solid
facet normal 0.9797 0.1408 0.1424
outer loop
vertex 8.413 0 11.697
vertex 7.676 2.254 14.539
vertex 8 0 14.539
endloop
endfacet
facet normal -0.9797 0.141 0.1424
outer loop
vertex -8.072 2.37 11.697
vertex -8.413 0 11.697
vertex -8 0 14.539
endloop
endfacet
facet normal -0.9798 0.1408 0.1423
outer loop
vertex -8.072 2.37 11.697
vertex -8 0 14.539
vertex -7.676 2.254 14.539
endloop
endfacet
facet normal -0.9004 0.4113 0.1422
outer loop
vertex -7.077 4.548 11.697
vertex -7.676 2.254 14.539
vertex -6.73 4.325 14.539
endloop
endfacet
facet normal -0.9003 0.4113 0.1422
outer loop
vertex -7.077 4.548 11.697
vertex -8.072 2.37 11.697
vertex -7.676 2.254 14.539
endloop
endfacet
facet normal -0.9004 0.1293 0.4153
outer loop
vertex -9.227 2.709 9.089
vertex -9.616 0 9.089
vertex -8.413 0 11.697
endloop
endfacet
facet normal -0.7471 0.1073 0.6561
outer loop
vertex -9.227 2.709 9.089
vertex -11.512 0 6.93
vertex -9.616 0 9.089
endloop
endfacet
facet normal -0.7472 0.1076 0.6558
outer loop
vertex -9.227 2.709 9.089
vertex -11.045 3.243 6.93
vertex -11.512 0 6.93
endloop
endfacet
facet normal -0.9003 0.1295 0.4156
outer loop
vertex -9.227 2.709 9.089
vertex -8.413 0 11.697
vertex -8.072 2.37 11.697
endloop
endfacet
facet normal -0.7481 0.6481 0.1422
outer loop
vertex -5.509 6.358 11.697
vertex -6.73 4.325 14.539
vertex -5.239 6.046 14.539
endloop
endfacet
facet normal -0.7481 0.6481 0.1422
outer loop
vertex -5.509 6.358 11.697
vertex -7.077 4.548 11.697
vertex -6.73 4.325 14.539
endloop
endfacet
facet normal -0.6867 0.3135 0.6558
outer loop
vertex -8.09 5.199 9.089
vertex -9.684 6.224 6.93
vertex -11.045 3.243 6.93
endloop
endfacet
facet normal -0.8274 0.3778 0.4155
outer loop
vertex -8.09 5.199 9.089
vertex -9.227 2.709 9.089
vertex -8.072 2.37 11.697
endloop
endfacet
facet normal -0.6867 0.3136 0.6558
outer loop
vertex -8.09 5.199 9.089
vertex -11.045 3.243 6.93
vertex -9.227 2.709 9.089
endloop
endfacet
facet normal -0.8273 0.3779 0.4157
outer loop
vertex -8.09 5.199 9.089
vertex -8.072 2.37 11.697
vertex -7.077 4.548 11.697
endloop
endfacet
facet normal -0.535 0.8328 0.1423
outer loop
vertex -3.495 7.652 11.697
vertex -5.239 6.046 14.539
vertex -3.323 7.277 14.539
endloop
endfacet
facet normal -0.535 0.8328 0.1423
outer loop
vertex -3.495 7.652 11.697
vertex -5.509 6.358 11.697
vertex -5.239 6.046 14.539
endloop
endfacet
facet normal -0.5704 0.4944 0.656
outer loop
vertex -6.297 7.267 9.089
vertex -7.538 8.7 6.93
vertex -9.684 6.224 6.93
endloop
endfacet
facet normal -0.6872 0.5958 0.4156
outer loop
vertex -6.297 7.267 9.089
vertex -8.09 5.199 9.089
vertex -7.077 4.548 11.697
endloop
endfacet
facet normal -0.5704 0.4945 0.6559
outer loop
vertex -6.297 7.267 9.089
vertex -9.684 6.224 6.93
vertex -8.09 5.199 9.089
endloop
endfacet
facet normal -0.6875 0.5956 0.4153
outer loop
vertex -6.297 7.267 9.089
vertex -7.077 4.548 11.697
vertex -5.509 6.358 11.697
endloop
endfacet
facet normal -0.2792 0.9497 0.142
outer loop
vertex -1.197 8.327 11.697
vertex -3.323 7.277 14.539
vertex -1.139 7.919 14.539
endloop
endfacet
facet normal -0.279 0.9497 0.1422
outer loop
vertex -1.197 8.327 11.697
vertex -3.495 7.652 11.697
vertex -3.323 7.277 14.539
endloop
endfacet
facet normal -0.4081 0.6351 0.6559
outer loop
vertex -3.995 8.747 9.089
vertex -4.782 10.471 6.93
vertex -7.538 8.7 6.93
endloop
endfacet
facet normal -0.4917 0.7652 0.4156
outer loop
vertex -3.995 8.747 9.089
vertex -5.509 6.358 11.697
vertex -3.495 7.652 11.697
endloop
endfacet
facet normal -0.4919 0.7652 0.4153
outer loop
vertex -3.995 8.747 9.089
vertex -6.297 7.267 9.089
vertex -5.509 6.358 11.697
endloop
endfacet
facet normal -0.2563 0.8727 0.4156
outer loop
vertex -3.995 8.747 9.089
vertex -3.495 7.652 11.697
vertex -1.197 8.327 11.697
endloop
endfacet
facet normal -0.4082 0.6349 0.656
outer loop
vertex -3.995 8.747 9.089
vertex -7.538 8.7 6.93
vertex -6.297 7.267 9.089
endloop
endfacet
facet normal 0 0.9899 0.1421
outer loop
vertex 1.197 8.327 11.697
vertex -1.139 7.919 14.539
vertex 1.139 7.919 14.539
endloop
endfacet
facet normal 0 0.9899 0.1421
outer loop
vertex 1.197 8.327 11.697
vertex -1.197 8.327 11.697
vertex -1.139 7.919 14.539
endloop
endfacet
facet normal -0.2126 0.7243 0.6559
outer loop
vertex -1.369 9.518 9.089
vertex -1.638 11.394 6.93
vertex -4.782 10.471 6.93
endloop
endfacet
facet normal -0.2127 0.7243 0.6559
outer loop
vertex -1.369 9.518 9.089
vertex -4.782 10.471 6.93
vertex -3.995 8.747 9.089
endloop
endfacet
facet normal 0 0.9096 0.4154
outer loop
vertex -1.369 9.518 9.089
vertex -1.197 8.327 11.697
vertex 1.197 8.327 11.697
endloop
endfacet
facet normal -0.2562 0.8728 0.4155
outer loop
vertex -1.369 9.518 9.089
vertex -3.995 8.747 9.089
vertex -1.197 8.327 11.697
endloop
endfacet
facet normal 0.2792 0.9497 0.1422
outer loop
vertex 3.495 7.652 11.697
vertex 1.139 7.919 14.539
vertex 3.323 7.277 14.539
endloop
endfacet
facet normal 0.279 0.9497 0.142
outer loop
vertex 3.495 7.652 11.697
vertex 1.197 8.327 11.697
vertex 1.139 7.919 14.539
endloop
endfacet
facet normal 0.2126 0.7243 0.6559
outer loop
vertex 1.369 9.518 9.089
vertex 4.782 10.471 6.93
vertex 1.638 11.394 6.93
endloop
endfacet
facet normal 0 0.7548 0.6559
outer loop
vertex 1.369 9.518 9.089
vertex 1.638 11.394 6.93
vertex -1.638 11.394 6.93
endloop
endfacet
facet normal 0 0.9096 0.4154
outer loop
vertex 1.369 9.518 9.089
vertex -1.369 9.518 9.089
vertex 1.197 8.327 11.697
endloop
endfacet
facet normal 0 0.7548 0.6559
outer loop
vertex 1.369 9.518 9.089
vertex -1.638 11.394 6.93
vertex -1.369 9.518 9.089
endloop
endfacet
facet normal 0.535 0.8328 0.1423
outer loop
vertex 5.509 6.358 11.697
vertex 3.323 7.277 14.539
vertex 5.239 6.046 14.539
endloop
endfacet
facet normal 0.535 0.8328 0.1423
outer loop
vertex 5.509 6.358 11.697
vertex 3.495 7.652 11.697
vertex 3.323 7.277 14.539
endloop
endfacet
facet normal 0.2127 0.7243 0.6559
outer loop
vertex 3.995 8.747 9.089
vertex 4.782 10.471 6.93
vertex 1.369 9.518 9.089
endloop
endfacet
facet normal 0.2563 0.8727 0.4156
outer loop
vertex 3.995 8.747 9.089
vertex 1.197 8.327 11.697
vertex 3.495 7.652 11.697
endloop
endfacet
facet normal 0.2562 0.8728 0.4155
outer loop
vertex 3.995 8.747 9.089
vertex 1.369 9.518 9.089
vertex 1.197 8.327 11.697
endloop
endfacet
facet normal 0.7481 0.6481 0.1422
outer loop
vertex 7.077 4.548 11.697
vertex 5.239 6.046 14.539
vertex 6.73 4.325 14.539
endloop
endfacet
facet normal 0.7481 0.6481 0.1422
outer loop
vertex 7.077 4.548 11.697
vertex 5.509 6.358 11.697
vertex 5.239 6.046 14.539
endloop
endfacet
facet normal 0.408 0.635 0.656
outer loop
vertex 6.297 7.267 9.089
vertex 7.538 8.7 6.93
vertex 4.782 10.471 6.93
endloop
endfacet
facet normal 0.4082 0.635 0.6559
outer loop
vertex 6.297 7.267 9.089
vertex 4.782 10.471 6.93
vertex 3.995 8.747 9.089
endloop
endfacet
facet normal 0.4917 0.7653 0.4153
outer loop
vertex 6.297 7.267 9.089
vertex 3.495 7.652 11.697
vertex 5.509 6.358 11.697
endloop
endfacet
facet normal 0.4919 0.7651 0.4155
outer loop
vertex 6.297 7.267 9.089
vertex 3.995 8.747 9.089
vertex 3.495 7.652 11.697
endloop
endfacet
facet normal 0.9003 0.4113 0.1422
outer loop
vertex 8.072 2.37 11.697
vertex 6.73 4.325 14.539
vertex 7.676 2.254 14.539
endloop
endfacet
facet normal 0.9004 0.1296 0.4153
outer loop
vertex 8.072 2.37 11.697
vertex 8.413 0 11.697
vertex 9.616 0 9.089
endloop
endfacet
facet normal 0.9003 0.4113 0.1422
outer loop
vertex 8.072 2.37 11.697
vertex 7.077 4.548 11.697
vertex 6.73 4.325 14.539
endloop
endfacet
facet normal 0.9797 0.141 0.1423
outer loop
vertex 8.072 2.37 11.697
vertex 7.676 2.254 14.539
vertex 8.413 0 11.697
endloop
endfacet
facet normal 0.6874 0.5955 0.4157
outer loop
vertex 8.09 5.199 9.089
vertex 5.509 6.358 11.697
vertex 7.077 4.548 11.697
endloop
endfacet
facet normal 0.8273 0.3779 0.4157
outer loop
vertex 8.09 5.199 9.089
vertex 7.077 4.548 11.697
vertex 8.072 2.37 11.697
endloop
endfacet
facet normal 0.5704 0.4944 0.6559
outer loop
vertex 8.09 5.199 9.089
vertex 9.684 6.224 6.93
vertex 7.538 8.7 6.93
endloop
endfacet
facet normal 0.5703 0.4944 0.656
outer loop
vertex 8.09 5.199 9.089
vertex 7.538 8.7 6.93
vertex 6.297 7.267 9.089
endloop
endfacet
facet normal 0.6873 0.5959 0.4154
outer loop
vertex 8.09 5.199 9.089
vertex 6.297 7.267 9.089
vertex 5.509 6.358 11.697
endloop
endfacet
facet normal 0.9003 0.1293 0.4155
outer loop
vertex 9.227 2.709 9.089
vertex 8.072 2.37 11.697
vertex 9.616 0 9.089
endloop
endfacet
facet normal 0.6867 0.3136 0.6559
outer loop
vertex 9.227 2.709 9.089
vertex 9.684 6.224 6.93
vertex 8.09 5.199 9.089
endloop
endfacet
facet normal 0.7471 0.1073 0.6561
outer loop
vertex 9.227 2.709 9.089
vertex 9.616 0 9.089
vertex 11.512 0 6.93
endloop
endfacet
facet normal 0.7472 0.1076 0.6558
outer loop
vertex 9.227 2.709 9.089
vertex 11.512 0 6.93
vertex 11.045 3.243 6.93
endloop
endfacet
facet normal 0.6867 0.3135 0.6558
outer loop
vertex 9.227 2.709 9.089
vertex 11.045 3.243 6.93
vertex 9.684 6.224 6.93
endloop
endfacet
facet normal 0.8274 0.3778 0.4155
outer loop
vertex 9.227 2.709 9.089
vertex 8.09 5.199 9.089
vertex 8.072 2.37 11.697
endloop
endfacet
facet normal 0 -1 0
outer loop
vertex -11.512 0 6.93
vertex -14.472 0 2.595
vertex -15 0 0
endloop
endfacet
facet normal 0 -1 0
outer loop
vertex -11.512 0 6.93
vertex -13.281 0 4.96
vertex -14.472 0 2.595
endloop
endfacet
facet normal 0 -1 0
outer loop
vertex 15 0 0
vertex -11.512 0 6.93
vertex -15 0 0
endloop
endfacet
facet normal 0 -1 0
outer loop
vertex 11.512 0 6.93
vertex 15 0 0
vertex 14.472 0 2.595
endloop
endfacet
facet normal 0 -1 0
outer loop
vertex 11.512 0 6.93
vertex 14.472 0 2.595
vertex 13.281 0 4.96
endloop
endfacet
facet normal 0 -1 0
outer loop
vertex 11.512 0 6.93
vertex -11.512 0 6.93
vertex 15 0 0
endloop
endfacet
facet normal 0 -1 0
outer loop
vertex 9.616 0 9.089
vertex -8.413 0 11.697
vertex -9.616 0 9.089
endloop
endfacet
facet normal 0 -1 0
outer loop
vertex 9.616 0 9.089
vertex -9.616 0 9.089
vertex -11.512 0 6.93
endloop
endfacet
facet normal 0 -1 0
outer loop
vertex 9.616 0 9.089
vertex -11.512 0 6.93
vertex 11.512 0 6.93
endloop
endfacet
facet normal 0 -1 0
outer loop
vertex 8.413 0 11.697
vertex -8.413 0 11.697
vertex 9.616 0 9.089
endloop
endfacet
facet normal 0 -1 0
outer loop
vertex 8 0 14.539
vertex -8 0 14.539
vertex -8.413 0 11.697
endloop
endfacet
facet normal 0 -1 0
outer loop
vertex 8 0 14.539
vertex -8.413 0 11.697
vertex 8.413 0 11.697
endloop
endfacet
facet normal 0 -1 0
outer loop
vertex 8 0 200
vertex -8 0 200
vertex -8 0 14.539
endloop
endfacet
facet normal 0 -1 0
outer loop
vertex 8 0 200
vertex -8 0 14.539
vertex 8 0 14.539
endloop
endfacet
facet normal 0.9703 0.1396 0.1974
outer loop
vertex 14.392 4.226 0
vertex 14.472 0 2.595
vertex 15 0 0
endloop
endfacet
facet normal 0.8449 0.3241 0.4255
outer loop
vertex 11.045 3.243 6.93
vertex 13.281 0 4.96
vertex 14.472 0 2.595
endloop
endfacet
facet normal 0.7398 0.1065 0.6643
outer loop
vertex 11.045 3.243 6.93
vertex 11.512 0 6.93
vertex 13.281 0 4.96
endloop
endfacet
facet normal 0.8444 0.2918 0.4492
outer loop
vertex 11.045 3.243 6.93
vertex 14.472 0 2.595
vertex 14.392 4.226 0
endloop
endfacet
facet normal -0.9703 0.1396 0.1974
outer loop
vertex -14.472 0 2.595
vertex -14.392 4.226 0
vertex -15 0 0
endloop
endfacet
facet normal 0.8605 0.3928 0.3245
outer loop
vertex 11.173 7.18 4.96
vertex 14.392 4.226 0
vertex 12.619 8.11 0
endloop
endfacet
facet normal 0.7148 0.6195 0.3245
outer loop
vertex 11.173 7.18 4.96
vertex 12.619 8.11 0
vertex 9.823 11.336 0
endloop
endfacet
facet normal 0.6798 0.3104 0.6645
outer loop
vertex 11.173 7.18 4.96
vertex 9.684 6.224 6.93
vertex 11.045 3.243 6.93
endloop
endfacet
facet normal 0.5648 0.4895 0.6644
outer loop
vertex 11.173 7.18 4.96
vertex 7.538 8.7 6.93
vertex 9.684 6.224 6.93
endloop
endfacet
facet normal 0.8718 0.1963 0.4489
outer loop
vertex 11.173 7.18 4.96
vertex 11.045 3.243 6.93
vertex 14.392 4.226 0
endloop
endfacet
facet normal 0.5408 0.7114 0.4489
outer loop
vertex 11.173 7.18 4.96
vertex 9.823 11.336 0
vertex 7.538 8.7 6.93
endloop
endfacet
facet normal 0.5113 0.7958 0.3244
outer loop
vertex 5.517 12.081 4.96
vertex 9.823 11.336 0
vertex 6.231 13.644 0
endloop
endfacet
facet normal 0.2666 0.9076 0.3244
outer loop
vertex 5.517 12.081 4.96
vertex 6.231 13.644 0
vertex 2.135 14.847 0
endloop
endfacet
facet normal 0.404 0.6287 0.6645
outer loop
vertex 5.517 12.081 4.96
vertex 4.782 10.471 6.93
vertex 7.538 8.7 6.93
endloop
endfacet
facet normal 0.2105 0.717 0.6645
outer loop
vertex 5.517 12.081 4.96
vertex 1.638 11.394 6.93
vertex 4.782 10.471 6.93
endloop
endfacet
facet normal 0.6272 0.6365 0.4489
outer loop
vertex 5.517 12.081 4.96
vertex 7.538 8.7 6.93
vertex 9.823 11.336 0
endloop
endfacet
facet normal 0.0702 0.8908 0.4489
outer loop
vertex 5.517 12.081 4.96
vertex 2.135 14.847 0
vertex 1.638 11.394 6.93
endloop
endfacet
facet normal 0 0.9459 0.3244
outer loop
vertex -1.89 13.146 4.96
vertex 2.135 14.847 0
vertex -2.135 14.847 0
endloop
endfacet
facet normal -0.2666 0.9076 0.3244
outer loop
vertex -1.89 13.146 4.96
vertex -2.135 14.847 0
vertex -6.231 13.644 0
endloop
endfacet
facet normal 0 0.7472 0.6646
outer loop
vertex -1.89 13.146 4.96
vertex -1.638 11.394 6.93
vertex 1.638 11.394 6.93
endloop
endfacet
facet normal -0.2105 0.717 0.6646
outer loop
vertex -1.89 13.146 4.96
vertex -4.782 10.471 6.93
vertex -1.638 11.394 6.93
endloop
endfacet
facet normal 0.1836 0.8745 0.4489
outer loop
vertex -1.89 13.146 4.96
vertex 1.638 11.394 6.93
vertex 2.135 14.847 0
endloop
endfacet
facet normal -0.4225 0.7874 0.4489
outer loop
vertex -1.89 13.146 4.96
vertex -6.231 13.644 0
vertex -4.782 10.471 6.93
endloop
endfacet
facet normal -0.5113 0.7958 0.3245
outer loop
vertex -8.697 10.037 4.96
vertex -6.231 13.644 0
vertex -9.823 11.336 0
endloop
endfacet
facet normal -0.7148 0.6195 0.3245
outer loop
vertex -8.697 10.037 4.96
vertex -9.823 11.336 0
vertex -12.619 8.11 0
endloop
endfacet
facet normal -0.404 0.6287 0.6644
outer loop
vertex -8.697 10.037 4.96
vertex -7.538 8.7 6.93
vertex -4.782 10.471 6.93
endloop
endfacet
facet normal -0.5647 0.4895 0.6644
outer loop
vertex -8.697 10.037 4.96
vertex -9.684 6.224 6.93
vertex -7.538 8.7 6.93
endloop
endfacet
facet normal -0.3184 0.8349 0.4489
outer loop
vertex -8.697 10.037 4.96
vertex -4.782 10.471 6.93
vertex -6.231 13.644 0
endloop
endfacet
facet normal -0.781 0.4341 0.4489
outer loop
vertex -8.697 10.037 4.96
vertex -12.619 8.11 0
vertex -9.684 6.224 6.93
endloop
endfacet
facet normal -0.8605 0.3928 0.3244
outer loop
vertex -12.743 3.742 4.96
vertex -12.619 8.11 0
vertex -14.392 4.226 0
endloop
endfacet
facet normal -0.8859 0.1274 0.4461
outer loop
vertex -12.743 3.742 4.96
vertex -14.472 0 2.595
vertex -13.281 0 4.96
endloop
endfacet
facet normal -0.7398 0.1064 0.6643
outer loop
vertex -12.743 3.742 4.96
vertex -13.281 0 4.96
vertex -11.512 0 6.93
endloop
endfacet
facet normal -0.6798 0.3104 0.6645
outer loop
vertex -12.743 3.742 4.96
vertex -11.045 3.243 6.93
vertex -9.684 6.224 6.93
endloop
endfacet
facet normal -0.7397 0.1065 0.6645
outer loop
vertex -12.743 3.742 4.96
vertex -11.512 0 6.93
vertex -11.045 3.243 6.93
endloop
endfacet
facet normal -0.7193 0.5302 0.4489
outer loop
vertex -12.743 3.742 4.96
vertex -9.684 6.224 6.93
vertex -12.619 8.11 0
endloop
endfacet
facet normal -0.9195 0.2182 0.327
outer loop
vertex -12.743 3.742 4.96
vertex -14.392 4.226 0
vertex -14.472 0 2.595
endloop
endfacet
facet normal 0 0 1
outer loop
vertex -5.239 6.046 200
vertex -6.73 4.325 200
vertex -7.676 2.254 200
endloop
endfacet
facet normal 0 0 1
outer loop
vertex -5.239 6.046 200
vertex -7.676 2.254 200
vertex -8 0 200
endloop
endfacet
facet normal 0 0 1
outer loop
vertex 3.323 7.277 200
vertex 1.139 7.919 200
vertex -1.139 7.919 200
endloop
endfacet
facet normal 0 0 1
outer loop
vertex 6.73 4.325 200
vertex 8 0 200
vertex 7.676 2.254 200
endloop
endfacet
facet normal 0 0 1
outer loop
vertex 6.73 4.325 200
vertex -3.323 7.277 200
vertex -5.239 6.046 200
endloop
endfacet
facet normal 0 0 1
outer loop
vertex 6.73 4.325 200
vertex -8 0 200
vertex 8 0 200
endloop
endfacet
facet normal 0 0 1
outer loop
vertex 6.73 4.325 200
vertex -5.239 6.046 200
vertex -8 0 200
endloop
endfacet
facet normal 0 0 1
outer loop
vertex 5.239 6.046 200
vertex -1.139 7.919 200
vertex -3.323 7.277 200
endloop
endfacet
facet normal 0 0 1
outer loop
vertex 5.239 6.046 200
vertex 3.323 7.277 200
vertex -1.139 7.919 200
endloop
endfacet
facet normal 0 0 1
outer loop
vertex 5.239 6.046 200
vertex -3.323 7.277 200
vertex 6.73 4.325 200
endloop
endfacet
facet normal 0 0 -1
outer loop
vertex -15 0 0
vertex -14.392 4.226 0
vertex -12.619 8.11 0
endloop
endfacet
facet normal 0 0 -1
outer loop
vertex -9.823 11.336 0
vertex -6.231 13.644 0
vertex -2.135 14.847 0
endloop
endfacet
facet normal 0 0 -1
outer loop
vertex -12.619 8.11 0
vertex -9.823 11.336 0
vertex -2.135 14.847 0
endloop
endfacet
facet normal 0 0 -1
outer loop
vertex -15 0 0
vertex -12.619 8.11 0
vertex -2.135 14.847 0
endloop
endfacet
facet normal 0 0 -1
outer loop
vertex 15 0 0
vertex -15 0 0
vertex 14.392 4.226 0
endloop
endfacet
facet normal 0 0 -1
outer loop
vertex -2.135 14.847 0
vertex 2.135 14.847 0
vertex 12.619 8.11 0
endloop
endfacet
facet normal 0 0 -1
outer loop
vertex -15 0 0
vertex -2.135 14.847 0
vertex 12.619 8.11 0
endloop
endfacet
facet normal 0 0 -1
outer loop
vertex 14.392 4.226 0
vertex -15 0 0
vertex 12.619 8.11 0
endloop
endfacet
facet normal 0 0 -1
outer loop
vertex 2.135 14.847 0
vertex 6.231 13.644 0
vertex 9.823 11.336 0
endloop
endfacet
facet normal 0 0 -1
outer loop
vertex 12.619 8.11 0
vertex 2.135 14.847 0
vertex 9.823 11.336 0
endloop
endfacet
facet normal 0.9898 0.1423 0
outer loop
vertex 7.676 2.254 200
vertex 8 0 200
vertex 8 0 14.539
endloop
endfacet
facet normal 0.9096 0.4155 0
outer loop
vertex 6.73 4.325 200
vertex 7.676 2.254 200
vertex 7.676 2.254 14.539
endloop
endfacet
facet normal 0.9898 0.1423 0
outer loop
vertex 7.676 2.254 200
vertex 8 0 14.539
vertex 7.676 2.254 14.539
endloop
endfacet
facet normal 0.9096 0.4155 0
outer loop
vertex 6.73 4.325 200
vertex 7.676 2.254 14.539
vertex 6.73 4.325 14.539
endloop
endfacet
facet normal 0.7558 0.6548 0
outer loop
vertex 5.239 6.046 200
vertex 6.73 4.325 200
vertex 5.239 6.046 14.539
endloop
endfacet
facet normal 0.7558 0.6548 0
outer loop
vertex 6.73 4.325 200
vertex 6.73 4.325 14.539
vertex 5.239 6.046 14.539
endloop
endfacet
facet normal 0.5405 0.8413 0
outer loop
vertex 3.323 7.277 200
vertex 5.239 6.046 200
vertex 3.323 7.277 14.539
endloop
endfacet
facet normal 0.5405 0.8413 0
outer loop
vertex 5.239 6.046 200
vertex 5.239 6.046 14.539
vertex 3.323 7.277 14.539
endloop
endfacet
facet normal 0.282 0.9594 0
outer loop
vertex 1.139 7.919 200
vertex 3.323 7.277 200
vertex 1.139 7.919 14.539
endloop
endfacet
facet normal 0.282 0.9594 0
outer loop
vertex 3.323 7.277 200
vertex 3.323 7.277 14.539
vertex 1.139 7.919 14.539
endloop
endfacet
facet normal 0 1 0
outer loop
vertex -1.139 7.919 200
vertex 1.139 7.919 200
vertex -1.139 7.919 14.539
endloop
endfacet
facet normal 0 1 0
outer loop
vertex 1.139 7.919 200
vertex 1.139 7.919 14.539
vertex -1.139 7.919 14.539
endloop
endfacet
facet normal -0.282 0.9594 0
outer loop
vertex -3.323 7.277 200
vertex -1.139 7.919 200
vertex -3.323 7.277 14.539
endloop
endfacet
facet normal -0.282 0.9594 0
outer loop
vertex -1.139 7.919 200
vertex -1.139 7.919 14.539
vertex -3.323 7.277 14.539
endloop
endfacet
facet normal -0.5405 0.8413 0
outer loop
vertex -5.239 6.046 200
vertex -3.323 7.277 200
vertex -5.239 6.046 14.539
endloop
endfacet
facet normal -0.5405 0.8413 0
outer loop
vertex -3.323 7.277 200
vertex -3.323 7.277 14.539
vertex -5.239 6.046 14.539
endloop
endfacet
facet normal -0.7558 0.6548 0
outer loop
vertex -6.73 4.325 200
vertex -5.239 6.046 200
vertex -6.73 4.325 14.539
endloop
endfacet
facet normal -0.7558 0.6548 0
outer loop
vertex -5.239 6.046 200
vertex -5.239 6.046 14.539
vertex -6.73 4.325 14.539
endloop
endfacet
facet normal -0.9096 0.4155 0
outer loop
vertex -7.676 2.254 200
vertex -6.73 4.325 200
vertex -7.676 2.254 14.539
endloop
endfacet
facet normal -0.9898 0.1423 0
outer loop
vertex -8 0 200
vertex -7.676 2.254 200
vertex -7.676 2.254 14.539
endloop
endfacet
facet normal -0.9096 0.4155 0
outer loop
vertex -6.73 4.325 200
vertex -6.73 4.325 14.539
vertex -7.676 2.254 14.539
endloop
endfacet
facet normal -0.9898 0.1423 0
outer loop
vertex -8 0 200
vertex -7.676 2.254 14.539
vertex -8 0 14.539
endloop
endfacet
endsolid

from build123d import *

# Parameters (mm, degrees)
F1_DEPTH    = 5
F2_DEPTH    = 200
F3_T2_ANGLE = 180
F4_T2_ANGLE = 275.6465366004


# Not quite as in the source:
# - a fillet or chamfer that OpenCascade refuses, or shapes differently, is made with other operations: its cross-section is extruded or revolved along the edge and cut away or added


with BuildPart() as f1:
    # F0 (on Top) → F1 (new body)
    with BuildSketch(Plane.XY):
        with BuildLine():
            ThreePointArc((15, 0), (0, 15), (-15, 0))
            Line((-15, 0), (-8, 0))
            ThreePointArc((-8, 0), (0, 8), (8, 0))
            Line((8, 0), (15, 0))
        make_face()
        with BuildLine():
            ThreePointArc((8, 0), (0, 8), (-8, 0))
            Line((-8, 0), (8, 0))
        make_face()
    extrude(amount=F1_DEPTH)

    # F0 (on Top) → F2 (join)
    with BuildSketch(Plane.XY):
        with BuildLine():
            ThreePointArc((8, 0), (0, 8), (-8, 0))
            Line((-8, 0), (8, 0))
        make_face()
    extrude(amount=F2_DEPTH)

    # F3: fillet of radius 10 on 1 edges, made by hand

    # F3_s1 → F3_t2 (revolve)
    with BuildSketch(Plane.XZ):
        with BuildLine():
            ThreePointArc((-8, 14.5393920142), (-9.9377422517, 8.6233122311), (-15, 5))
            Line((-15, 5), (-8, 5))
            Line((-8, 5), (-8, 14.5393920142))
        make_face()
    revolve(axis=Axis((0, 0, 5), (0, 0, -1)), revolution_arc=F3_T2_ANGLE)

    # F4: fillet of radius 10 on 1 edges, made by hand

    # F4_s1 → F4_t2 (revolve, cut)
    with BuildSketch(Plane(origin=(0, 0, 0), x_dir=(0, 0, 1), z_dir=(-0.7410773266, -0.6714196869, 0))):
        with BuildLine():
            ThreePointArc((0, -15), (3.8172075141, -13.9552733931), (6.9301950027, -11.511539409))
            ThreePointArc((6.9301950027, -11.511539409), (5.7894854023, -13.1586020321), (5, -15))
            Line((5, -15), (0, -15))
        make_face()
    revolve(axis=Axis((0, 0, 5), (0, 0, 1)), revolution_arc=F4_T2_ANGLE, mode=Mode.SUBTRACT)


solid = f1.part
